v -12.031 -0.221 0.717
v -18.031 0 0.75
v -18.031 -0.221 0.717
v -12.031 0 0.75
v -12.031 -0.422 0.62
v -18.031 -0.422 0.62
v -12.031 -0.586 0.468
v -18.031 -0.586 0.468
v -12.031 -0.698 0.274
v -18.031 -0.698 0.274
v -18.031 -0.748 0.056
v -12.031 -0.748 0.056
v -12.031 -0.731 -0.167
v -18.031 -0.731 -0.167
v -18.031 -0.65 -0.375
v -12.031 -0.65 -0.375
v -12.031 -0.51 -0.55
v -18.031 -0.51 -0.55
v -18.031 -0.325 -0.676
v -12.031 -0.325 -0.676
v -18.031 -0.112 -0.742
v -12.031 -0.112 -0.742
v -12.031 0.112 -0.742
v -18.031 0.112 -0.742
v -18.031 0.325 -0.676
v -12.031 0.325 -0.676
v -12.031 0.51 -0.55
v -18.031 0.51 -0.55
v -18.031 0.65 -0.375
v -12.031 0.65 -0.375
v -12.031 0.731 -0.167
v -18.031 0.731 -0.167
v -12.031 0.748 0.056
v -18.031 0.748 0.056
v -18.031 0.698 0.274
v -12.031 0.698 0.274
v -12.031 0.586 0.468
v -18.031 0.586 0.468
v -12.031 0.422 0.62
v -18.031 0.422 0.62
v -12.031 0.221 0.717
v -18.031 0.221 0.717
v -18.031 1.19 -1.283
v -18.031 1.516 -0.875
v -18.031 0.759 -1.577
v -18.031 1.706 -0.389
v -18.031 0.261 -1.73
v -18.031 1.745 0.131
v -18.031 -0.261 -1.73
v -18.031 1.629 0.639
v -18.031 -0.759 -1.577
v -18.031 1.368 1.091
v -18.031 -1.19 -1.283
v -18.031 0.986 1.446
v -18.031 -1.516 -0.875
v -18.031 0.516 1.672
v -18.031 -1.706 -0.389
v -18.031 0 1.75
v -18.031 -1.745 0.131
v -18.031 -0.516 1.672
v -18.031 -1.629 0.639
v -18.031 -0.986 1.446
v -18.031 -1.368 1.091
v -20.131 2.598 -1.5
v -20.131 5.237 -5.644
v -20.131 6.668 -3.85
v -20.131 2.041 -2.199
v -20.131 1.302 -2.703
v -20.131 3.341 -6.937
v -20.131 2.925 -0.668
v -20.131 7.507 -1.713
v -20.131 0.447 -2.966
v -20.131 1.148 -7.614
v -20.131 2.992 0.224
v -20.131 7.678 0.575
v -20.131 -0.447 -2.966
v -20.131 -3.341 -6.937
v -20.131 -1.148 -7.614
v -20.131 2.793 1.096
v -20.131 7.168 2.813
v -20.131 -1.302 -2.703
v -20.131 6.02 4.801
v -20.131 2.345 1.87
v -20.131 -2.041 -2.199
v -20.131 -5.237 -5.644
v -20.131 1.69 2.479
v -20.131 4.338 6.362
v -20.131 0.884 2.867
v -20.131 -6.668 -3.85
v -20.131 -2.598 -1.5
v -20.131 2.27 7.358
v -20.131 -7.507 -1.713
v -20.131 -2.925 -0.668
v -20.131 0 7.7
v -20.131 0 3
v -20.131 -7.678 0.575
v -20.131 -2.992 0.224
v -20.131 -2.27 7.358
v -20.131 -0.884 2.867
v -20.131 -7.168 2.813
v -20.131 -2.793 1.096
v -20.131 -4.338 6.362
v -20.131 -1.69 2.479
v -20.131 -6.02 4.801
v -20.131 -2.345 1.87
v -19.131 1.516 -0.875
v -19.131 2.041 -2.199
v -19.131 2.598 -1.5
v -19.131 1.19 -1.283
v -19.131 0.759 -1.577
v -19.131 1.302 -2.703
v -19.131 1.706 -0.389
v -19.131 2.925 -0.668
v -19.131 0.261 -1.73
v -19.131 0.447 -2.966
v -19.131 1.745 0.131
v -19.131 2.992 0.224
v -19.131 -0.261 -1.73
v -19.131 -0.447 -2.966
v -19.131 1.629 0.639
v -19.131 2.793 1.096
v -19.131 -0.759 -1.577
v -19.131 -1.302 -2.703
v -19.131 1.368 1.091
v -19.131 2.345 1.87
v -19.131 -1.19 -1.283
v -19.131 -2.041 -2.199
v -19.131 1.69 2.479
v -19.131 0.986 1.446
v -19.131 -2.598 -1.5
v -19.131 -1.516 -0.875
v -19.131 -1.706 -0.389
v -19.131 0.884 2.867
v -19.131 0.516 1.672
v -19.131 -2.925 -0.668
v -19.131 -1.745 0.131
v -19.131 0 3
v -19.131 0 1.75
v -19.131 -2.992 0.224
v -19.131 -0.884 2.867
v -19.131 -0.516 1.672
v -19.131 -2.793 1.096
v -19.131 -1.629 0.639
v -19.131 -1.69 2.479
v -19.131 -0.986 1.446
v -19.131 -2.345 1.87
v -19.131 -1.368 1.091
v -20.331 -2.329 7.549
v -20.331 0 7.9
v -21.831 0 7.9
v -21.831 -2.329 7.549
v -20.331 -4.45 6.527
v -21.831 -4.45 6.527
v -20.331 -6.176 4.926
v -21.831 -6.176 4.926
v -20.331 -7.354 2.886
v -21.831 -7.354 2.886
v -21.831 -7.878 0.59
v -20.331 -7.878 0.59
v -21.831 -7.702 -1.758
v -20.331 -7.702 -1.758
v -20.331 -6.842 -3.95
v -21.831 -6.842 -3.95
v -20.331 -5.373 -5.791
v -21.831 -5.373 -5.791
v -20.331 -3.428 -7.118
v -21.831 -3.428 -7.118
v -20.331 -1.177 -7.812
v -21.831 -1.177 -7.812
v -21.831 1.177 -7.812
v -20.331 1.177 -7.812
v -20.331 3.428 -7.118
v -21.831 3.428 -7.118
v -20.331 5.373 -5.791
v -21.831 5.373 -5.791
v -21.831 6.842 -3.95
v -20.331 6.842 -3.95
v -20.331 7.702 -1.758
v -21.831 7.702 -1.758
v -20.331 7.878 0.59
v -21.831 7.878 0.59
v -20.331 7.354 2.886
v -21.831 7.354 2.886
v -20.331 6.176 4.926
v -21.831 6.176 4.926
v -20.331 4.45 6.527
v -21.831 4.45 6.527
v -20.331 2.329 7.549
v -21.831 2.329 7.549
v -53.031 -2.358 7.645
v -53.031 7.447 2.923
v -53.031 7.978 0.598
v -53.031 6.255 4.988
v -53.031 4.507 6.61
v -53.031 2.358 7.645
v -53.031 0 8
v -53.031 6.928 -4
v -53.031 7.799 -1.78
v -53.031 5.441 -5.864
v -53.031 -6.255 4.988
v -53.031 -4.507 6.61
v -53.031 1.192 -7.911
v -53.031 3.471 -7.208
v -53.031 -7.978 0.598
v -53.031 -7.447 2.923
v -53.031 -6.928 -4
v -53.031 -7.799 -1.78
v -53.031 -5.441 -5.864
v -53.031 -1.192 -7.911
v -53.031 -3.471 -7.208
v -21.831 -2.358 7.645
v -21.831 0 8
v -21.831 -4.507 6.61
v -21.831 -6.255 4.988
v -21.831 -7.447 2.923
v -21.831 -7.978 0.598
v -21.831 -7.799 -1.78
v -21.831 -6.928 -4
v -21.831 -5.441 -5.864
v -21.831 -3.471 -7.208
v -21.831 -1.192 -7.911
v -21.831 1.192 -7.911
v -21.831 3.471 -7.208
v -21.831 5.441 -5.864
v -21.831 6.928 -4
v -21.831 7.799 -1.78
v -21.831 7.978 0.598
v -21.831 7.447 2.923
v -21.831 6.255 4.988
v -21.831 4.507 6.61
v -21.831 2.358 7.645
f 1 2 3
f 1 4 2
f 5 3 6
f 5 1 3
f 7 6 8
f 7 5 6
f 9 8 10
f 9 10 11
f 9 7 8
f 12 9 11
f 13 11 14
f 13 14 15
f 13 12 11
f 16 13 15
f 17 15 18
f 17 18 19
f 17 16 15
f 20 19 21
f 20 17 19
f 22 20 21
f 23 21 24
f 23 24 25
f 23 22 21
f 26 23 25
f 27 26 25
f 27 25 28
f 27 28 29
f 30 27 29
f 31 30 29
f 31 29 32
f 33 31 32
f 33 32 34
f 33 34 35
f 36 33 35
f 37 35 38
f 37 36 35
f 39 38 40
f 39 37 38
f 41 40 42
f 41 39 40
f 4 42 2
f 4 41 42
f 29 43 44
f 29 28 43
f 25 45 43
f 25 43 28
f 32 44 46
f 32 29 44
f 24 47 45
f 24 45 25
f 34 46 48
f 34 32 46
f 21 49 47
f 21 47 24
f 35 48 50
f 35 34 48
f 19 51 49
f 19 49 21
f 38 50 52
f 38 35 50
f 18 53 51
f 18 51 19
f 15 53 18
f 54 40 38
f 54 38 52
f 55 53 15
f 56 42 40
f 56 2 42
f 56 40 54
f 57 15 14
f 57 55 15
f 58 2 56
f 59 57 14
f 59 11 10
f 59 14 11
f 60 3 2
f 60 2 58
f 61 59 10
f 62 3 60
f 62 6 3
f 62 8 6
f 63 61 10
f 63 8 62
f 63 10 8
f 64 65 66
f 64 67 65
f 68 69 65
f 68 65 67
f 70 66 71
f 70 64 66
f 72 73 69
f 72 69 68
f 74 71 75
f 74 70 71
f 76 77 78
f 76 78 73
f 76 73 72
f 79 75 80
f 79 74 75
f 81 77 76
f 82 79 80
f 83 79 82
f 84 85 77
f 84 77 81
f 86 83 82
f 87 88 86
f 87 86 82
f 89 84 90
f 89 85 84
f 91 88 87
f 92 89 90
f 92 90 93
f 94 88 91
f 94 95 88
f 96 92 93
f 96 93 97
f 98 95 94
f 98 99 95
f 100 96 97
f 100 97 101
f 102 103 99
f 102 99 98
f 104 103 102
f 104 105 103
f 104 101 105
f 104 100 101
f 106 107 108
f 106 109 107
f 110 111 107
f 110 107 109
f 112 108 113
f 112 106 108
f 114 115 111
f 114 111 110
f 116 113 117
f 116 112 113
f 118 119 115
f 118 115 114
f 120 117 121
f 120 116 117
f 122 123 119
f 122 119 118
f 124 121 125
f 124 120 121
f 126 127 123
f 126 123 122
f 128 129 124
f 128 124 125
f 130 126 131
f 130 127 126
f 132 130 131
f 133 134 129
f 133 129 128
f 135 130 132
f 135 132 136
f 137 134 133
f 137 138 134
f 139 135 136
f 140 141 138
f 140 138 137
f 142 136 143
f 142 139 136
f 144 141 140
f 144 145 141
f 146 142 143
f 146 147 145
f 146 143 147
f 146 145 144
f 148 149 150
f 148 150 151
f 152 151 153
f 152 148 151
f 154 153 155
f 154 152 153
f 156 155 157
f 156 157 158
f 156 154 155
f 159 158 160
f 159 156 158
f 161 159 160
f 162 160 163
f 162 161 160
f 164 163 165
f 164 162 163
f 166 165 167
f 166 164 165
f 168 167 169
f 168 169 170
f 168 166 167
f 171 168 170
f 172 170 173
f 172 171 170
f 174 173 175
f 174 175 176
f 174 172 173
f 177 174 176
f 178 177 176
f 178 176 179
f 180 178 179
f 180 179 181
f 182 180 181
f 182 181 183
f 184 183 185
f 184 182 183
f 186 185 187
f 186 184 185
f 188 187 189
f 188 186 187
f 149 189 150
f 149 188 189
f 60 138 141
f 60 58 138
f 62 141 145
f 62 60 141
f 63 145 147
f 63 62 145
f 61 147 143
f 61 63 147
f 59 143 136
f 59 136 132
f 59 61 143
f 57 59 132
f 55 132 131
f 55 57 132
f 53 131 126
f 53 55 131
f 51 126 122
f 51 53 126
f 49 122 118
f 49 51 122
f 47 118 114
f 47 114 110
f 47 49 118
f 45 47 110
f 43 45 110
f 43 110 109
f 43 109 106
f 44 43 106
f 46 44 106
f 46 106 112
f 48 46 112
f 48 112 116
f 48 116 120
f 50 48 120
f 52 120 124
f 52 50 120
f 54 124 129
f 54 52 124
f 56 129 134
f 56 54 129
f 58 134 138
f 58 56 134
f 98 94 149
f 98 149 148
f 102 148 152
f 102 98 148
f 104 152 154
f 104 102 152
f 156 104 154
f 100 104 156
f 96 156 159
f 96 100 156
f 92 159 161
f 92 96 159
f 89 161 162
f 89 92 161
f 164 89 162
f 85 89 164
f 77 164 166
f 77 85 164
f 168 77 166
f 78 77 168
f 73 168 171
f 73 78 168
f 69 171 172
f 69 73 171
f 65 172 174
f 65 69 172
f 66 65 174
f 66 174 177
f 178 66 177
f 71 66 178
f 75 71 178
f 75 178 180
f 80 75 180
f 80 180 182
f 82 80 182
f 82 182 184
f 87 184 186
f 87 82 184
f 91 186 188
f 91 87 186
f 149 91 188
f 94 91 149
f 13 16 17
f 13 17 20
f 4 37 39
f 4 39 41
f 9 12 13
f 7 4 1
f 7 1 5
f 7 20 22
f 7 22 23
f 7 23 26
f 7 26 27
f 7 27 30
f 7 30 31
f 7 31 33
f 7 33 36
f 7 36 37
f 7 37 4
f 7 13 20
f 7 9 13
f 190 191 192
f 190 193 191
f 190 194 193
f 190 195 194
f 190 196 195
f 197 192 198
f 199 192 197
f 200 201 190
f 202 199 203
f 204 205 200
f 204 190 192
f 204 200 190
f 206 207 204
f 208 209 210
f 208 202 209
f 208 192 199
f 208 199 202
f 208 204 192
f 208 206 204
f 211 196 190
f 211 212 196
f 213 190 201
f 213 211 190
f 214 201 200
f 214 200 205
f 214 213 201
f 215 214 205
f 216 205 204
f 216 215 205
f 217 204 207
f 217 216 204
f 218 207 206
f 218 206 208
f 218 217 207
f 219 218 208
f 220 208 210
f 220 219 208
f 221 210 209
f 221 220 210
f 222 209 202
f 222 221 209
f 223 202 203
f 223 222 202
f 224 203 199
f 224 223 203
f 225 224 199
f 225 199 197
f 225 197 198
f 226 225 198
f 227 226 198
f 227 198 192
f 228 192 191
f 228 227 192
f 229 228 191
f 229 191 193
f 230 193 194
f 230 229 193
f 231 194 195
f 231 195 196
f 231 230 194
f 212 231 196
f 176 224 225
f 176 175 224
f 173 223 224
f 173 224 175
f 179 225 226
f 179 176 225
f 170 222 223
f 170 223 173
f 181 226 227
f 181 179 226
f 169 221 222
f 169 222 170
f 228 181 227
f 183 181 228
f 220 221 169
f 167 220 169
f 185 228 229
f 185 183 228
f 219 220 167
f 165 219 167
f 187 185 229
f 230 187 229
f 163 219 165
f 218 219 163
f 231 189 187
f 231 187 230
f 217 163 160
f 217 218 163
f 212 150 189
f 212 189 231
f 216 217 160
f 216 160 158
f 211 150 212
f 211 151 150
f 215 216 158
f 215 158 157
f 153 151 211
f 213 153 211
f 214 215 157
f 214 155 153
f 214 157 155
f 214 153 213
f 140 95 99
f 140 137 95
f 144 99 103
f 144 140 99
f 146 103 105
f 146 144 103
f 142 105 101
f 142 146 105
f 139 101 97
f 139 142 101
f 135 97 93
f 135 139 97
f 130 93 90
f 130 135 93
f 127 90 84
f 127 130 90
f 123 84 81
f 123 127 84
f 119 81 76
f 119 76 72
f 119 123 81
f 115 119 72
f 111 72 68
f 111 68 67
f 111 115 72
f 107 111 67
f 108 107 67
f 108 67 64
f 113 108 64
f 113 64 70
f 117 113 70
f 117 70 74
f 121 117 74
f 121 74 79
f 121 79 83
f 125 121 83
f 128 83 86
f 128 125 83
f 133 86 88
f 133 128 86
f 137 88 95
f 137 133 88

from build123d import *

# Parameters (mm, degrees)
CHANFREIN1_SIZE = 0.2


with BuildPart() as part:
    # Esquisse1 → Révolution1 (revolve)
    with BuildSketch(Plane.XY, mode=Mode.PRIVATE) as r_volution1_sk:
        Polygon((-53.031441654, 0), (-53.031441654, 8), (-21.831441654, 8), (-21.831441654, 7.9), (-20.131441654, 7.9), (-20.131441654, 3), (-19.131441654, 3), (-19.131441654, 1.75), (-18.031441654, 1.75), (-18.031441654, 0.75), (-12.031441654, 0.75), (-12.031441654, 0), align=None)
    revolve(r_volution1_sk.sketch.rotate(Axis((-60.261349275, 0, 0), (1, 0, 0)), 90), axis=Axis((-60.261349275, 0, 0), (1, 0, 0)))

    # Chanfrein1
    chanfrein1_edges = [part.edges().sort_by_distance(p)[0] for p in [
        (-20.131441654, 0, -7.9),
    ]]
    chamfer(chanfrein1_edges, length=CHANFREIN1_SIZE)


solid = part.part
